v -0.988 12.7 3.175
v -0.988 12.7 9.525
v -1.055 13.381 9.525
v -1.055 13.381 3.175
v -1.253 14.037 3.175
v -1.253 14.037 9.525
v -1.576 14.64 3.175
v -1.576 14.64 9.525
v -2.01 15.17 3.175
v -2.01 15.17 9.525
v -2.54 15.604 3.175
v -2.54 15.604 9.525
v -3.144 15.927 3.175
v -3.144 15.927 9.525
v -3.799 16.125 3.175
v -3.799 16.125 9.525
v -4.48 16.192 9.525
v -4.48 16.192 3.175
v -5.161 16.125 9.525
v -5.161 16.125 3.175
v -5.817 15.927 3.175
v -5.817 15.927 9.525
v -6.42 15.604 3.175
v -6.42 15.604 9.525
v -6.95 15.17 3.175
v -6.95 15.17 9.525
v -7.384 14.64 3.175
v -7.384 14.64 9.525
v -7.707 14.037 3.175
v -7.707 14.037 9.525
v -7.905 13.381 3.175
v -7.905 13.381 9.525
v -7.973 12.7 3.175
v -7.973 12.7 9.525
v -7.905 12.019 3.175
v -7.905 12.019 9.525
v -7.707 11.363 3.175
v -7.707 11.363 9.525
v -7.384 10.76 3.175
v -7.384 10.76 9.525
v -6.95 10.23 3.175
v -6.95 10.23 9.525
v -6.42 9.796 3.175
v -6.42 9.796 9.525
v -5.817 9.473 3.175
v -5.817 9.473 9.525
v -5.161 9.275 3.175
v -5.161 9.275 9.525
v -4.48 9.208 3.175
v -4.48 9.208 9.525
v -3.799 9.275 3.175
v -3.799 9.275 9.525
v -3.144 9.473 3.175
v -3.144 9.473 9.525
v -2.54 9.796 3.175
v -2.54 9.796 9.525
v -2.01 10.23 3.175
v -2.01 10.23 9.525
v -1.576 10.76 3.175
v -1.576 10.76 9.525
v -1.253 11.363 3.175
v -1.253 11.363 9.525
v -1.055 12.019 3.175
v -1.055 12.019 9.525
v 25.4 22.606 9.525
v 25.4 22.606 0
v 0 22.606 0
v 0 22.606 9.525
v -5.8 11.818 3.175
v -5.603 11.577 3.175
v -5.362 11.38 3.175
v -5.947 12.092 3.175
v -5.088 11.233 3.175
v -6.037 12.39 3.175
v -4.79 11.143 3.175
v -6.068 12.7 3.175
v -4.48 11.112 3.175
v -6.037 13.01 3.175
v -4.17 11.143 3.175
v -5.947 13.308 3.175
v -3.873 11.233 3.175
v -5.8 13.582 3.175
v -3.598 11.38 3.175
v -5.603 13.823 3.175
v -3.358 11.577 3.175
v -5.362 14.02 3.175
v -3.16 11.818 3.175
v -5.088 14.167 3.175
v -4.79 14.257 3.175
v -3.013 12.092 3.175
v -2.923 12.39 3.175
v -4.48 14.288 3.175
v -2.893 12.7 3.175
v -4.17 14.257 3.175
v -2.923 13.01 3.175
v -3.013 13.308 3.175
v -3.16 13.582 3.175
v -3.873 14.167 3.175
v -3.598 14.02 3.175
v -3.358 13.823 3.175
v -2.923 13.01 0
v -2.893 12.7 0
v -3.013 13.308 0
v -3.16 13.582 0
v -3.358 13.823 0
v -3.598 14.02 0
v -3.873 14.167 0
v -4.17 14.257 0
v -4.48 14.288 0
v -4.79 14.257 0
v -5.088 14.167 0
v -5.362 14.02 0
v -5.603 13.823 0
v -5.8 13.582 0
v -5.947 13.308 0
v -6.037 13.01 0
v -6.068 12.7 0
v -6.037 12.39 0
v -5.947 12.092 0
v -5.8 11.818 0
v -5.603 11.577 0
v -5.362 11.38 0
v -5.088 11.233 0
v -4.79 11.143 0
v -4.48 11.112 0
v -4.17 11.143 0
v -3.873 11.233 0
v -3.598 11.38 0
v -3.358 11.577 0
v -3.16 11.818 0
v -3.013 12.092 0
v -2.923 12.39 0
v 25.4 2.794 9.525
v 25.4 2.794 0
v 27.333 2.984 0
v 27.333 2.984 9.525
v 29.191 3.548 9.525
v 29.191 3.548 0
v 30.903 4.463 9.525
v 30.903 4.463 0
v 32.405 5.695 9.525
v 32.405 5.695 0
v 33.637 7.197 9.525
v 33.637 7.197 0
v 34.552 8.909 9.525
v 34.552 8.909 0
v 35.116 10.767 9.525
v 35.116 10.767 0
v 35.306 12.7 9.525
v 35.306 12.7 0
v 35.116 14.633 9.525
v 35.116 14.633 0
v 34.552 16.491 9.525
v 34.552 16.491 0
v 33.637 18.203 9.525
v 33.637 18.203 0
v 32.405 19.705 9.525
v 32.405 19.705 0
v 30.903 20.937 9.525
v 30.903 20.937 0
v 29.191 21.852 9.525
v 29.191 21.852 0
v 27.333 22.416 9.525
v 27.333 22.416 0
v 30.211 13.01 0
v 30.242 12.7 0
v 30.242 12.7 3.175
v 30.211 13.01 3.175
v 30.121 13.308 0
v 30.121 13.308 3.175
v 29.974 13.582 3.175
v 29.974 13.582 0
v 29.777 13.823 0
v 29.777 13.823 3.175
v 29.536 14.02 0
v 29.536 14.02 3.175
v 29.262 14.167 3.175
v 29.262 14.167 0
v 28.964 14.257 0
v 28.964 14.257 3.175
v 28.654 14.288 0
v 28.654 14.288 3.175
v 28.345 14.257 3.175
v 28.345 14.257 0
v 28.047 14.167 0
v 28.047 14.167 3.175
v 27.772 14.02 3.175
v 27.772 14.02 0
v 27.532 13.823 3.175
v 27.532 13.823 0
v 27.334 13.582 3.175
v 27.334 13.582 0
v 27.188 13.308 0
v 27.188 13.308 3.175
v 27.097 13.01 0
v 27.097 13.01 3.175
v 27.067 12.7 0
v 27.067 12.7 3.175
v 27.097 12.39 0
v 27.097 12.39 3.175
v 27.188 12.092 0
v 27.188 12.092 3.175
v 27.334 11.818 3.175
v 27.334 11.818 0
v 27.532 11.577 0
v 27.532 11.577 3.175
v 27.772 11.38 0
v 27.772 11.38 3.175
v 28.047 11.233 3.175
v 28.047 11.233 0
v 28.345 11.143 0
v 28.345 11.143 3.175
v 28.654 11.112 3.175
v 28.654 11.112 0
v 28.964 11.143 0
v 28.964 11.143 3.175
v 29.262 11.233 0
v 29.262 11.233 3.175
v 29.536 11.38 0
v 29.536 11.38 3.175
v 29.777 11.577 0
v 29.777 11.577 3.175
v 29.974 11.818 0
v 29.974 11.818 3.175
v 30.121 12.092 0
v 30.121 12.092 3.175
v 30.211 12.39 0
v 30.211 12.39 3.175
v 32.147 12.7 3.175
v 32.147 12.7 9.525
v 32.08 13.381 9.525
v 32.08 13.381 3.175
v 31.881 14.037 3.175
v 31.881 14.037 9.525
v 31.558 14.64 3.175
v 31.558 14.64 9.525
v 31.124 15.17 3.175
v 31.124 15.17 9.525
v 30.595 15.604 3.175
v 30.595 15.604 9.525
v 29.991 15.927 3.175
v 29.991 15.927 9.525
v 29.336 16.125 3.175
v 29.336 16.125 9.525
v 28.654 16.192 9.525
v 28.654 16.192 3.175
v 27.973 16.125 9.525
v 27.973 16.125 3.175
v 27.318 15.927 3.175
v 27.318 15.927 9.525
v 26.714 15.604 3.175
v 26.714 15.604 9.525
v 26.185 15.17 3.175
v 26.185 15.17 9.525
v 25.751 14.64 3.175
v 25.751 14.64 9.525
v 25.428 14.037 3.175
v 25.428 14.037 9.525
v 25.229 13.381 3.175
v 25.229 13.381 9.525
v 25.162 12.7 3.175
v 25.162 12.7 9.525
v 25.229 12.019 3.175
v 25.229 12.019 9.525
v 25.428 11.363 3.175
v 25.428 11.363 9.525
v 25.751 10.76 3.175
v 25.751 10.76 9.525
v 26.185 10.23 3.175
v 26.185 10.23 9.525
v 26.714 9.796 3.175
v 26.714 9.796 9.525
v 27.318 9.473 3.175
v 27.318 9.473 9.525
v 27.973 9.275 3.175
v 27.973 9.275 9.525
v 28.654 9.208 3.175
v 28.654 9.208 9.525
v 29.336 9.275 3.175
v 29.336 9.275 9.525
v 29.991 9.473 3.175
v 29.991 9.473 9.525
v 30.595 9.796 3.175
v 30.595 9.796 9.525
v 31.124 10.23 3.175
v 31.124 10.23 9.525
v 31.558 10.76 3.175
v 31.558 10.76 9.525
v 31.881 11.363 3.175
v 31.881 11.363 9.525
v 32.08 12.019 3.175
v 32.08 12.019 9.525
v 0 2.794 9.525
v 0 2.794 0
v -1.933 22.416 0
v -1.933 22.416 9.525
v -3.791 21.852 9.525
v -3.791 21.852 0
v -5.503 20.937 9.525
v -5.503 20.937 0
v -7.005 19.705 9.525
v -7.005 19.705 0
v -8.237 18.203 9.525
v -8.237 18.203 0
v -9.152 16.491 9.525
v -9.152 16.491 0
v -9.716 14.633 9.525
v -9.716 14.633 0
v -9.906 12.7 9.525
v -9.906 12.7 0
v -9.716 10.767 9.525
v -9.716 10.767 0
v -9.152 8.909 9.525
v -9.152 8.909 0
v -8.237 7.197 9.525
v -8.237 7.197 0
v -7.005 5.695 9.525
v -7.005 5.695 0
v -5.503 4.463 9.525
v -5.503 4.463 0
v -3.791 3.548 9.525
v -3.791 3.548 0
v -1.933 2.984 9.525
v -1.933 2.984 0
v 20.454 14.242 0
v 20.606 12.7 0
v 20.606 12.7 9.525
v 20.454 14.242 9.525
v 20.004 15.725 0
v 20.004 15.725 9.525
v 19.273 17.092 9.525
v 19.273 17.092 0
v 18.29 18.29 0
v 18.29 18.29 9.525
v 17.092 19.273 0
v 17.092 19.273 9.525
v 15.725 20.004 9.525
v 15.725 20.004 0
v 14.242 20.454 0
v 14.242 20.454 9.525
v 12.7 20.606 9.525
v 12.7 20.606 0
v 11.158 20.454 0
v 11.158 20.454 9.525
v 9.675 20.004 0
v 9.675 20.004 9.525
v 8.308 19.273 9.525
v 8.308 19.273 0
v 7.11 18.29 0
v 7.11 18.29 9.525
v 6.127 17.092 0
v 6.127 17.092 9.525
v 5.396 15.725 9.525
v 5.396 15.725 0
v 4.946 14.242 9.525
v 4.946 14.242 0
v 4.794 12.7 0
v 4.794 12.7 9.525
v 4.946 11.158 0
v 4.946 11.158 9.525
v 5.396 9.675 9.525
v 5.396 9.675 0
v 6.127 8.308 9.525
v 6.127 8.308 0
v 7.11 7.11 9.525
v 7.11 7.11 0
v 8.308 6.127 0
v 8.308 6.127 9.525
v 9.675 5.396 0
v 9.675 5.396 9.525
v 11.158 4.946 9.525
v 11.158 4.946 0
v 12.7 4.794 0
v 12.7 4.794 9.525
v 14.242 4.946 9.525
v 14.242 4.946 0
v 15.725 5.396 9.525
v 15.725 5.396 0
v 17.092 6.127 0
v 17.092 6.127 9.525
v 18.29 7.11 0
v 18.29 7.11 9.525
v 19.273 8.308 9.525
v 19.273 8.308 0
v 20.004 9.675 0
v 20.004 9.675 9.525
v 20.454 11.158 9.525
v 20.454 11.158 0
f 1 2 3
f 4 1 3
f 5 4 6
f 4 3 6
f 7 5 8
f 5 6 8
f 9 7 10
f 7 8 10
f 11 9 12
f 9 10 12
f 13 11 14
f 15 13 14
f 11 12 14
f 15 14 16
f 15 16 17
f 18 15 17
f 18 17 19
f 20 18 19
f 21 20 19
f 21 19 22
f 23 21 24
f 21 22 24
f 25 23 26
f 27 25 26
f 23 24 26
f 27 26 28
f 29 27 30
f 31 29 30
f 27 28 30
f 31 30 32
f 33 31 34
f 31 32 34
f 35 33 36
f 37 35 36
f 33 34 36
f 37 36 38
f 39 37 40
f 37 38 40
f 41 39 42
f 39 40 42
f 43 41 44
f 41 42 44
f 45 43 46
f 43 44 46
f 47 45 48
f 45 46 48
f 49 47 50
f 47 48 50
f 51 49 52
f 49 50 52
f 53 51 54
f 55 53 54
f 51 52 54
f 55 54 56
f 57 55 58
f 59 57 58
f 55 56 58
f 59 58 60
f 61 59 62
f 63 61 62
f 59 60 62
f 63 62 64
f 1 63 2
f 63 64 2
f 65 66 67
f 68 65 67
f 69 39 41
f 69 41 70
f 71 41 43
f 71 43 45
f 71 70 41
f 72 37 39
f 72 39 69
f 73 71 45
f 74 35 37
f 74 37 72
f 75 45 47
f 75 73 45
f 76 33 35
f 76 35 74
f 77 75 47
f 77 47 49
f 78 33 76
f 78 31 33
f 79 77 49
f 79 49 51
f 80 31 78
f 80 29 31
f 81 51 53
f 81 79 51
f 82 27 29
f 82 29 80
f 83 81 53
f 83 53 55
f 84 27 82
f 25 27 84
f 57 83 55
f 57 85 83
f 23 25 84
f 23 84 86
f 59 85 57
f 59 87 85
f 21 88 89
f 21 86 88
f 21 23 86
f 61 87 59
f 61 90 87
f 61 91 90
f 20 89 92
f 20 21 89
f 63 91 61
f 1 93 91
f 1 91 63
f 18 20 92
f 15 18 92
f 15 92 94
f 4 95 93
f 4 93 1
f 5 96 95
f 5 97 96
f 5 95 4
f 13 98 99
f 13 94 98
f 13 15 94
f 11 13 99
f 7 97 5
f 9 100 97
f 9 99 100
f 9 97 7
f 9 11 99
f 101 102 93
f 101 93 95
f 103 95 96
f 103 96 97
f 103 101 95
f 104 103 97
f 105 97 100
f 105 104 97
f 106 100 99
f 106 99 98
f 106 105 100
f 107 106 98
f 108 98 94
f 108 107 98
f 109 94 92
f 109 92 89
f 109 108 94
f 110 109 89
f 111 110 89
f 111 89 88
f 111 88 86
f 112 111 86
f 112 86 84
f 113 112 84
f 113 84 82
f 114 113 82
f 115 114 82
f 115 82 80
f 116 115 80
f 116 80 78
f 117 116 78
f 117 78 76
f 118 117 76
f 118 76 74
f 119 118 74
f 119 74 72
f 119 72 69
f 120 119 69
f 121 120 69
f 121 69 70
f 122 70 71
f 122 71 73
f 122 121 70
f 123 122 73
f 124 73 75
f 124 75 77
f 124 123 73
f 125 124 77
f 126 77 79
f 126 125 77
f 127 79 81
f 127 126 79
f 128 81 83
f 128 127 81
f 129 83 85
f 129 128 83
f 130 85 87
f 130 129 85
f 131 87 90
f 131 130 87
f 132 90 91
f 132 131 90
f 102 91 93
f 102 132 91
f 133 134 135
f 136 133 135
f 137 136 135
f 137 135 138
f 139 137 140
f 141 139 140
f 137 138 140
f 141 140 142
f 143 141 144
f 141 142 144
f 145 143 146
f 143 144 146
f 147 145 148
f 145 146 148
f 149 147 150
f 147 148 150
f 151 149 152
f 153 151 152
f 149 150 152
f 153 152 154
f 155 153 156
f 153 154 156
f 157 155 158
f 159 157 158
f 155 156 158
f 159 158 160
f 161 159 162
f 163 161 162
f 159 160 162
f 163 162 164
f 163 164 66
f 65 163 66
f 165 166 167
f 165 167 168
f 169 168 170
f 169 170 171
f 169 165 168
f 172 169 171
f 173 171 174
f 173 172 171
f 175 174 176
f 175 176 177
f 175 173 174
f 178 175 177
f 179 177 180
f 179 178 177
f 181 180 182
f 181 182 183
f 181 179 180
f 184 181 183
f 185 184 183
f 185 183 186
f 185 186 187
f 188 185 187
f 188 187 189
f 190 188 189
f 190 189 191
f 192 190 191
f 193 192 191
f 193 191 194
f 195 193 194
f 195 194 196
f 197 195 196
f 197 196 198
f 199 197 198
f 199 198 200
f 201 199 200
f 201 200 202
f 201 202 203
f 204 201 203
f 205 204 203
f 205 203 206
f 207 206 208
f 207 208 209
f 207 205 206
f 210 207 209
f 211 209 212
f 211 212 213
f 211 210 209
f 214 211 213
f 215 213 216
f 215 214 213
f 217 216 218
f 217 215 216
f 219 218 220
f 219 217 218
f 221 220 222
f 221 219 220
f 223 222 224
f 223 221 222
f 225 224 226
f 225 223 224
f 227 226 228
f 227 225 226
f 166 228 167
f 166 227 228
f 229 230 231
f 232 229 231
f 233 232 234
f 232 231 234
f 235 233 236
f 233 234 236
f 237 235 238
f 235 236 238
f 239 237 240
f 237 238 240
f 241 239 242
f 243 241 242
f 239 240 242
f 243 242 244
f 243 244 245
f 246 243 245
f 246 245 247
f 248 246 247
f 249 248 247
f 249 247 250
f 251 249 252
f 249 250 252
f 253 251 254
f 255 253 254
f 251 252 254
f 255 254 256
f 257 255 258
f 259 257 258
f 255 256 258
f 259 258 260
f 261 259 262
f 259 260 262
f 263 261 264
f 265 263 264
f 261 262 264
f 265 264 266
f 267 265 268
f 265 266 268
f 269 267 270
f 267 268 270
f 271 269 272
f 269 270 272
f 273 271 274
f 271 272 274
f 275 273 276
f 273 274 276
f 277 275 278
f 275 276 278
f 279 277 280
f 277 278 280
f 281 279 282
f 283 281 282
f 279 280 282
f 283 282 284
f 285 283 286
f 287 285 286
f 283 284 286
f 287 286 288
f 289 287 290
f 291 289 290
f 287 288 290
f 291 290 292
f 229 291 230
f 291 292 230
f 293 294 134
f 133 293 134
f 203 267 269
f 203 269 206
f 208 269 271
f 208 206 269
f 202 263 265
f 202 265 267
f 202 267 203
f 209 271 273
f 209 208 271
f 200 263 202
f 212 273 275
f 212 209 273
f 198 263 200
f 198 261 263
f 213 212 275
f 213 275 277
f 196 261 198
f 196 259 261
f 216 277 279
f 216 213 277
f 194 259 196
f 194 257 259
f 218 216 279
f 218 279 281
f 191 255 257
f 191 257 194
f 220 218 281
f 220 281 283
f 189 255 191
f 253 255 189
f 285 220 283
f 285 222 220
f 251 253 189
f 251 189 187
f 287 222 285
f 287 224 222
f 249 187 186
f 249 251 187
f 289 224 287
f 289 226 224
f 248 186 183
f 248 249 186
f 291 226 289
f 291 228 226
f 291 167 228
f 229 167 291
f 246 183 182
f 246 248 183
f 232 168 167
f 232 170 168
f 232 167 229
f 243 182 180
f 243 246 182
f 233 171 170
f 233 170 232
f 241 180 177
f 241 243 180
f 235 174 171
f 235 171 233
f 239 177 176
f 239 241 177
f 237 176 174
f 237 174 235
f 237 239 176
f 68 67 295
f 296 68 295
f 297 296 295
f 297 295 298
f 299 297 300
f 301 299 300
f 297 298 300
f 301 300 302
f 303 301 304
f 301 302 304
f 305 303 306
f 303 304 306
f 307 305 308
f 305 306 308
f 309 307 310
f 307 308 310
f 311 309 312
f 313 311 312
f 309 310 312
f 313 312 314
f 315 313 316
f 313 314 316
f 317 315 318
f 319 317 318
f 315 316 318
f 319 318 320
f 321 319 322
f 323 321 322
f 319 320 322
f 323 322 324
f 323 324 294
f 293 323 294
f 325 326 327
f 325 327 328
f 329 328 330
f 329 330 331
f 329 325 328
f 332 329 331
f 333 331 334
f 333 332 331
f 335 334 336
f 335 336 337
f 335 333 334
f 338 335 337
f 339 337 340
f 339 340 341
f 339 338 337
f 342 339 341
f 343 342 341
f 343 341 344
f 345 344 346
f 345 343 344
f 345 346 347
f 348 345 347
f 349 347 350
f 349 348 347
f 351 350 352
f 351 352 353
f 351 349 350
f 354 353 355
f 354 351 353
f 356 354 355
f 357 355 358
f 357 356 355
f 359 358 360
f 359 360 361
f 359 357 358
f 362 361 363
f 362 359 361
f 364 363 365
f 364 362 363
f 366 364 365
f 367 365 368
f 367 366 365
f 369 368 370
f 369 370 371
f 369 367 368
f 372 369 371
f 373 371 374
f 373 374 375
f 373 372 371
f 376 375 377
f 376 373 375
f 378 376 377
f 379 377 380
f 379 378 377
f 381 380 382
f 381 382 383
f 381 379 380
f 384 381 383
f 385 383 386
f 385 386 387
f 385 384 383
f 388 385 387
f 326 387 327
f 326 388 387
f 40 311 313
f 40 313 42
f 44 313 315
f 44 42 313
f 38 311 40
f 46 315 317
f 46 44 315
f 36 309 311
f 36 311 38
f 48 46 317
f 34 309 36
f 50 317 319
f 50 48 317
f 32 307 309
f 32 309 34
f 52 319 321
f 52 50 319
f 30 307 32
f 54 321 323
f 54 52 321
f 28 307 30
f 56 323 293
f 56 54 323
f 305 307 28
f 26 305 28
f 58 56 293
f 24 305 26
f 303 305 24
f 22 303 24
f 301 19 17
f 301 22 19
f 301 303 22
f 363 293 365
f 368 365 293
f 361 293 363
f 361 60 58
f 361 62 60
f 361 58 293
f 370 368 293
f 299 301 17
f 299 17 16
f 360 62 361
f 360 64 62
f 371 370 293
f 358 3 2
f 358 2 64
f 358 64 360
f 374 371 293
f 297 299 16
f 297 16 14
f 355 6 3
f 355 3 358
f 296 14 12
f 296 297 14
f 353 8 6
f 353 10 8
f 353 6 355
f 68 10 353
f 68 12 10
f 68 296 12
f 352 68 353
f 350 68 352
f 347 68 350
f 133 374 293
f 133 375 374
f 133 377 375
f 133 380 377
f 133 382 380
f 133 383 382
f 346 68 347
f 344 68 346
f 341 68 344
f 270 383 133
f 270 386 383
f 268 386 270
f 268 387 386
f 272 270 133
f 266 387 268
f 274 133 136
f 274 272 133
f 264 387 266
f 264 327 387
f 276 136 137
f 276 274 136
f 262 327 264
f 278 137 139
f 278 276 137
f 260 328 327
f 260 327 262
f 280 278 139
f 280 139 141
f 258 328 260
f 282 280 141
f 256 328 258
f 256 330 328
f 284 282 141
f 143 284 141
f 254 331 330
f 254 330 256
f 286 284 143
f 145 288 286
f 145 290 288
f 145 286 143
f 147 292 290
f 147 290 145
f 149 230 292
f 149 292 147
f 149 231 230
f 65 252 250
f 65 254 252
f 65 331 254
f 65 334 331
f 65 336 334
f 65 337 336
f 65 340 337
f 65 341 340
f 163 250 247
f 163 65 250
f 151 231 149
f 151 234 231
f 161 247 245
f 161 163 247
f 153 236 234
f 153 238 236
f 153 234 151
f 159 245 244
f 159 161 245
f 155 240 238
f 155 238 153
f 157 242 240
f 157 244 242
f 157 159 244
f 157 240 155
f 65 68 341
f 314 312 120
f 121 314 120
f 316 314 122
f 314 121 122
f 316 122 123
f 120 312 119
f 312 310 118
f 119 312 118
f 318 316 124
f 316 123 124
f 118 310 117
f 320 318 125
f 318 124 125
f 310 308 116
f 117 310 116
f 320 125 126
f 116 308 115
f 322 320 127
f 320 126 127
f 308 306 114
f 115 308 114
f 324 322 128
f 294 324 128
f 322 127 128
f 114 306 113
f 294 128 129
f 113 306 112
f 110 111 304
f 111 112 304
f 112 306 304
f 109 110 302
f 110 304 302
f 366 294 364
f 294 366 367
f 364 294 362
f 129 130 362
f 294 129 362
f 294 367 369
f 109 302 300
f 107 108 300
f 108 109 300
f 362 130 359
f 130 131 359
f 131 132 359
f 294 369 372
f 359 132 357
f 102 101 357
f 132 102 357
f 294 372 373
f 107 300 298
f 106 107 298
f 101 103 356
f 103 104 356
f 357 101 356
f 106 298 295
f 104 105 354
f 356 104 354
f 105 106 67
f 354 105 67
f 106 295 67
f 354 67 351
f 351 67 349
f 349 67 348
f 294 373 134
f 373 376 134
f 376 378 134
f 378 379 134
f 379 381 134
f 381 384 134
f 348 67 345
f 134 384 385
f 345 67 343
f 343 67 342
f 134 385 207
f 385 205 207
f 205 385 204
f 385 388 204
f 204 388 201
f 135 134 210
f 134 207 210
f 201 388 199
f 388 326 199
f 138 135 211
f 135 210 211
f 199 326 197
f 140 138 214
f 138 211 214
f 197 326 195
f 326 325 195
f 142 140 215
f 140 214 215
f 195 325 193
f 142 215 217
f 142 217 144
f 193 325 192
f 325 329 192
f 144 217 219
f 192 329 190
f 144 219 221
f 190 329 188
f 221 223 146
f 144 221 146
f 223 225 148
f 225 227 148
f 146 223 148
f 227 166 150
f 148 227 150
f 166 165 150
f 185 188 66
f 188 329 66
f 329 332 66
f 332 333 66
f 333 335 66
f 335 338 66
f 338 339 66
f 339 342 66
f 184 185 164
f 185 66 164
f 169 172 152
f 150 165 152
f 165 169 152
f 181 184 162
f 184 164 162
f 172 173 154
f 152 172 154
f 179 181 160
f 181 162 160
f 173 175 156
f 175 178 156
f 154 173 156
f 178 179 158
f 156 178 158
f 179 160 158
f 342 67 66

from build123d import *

# Parameters (mm, degrees)
F0_R     = 1.5875
F0_R_2   = 7.90575
F1_DEPTH = 9.525
F2_R     = 3.4925
F2_R_2   = 1.5875
F3_DEPTH = 6.35


with BuildPart() as f1:
    # F0 (on Top) → F1 (new body)
    with BuildSketch(Plane.XY):
        with BuildLine():
            Line((25.4, 22.606), (0, 22.606))
            ThreePointArc((0, 22.606), (-9.906, 12.7), (0, 2.794))
            Line((0, 2.794), (25.4, 2.794))
            ThreePointArc((25.4, 2.794), (35.306, 12.7), (25.4, 22.606))
        make_face()
        with Locations((-4.480041, 12.7)):
            Circle(F0_R, mode=Mode.SUBTRACT)
        with Locations((12.7, 12.7)):
            Circle(F0_R_2, mode=Mode.SUBTRACT)
        with Locations((28.654418, 12.7)):
            Circle(F0_R, mode=Mode.SUBTRACT)
    extrude(amount=F1_DEPTH)

    # F2 (on face) → F3 (cut)
    with BuildSketch(Plane.XY.offset(9.525)):
        with Locations((-4.480041, 12.7)):
            Circle(F2_R)
        with Locations((-4.480041, 12.7)):
            Circle(F2_R_2, mode=Mode.SUBTRACT)
        with Locations((28.654418, 12.7)):
            Circle(F2_R)
        with Locations((28.654418, 12.7)):
            Circle(F2_R_2, mode=Mode.SUBTRACT)
    extrude(amount=-F3_DEPTH, mode=Mode.SUBTRACT)


solid = f1.part
